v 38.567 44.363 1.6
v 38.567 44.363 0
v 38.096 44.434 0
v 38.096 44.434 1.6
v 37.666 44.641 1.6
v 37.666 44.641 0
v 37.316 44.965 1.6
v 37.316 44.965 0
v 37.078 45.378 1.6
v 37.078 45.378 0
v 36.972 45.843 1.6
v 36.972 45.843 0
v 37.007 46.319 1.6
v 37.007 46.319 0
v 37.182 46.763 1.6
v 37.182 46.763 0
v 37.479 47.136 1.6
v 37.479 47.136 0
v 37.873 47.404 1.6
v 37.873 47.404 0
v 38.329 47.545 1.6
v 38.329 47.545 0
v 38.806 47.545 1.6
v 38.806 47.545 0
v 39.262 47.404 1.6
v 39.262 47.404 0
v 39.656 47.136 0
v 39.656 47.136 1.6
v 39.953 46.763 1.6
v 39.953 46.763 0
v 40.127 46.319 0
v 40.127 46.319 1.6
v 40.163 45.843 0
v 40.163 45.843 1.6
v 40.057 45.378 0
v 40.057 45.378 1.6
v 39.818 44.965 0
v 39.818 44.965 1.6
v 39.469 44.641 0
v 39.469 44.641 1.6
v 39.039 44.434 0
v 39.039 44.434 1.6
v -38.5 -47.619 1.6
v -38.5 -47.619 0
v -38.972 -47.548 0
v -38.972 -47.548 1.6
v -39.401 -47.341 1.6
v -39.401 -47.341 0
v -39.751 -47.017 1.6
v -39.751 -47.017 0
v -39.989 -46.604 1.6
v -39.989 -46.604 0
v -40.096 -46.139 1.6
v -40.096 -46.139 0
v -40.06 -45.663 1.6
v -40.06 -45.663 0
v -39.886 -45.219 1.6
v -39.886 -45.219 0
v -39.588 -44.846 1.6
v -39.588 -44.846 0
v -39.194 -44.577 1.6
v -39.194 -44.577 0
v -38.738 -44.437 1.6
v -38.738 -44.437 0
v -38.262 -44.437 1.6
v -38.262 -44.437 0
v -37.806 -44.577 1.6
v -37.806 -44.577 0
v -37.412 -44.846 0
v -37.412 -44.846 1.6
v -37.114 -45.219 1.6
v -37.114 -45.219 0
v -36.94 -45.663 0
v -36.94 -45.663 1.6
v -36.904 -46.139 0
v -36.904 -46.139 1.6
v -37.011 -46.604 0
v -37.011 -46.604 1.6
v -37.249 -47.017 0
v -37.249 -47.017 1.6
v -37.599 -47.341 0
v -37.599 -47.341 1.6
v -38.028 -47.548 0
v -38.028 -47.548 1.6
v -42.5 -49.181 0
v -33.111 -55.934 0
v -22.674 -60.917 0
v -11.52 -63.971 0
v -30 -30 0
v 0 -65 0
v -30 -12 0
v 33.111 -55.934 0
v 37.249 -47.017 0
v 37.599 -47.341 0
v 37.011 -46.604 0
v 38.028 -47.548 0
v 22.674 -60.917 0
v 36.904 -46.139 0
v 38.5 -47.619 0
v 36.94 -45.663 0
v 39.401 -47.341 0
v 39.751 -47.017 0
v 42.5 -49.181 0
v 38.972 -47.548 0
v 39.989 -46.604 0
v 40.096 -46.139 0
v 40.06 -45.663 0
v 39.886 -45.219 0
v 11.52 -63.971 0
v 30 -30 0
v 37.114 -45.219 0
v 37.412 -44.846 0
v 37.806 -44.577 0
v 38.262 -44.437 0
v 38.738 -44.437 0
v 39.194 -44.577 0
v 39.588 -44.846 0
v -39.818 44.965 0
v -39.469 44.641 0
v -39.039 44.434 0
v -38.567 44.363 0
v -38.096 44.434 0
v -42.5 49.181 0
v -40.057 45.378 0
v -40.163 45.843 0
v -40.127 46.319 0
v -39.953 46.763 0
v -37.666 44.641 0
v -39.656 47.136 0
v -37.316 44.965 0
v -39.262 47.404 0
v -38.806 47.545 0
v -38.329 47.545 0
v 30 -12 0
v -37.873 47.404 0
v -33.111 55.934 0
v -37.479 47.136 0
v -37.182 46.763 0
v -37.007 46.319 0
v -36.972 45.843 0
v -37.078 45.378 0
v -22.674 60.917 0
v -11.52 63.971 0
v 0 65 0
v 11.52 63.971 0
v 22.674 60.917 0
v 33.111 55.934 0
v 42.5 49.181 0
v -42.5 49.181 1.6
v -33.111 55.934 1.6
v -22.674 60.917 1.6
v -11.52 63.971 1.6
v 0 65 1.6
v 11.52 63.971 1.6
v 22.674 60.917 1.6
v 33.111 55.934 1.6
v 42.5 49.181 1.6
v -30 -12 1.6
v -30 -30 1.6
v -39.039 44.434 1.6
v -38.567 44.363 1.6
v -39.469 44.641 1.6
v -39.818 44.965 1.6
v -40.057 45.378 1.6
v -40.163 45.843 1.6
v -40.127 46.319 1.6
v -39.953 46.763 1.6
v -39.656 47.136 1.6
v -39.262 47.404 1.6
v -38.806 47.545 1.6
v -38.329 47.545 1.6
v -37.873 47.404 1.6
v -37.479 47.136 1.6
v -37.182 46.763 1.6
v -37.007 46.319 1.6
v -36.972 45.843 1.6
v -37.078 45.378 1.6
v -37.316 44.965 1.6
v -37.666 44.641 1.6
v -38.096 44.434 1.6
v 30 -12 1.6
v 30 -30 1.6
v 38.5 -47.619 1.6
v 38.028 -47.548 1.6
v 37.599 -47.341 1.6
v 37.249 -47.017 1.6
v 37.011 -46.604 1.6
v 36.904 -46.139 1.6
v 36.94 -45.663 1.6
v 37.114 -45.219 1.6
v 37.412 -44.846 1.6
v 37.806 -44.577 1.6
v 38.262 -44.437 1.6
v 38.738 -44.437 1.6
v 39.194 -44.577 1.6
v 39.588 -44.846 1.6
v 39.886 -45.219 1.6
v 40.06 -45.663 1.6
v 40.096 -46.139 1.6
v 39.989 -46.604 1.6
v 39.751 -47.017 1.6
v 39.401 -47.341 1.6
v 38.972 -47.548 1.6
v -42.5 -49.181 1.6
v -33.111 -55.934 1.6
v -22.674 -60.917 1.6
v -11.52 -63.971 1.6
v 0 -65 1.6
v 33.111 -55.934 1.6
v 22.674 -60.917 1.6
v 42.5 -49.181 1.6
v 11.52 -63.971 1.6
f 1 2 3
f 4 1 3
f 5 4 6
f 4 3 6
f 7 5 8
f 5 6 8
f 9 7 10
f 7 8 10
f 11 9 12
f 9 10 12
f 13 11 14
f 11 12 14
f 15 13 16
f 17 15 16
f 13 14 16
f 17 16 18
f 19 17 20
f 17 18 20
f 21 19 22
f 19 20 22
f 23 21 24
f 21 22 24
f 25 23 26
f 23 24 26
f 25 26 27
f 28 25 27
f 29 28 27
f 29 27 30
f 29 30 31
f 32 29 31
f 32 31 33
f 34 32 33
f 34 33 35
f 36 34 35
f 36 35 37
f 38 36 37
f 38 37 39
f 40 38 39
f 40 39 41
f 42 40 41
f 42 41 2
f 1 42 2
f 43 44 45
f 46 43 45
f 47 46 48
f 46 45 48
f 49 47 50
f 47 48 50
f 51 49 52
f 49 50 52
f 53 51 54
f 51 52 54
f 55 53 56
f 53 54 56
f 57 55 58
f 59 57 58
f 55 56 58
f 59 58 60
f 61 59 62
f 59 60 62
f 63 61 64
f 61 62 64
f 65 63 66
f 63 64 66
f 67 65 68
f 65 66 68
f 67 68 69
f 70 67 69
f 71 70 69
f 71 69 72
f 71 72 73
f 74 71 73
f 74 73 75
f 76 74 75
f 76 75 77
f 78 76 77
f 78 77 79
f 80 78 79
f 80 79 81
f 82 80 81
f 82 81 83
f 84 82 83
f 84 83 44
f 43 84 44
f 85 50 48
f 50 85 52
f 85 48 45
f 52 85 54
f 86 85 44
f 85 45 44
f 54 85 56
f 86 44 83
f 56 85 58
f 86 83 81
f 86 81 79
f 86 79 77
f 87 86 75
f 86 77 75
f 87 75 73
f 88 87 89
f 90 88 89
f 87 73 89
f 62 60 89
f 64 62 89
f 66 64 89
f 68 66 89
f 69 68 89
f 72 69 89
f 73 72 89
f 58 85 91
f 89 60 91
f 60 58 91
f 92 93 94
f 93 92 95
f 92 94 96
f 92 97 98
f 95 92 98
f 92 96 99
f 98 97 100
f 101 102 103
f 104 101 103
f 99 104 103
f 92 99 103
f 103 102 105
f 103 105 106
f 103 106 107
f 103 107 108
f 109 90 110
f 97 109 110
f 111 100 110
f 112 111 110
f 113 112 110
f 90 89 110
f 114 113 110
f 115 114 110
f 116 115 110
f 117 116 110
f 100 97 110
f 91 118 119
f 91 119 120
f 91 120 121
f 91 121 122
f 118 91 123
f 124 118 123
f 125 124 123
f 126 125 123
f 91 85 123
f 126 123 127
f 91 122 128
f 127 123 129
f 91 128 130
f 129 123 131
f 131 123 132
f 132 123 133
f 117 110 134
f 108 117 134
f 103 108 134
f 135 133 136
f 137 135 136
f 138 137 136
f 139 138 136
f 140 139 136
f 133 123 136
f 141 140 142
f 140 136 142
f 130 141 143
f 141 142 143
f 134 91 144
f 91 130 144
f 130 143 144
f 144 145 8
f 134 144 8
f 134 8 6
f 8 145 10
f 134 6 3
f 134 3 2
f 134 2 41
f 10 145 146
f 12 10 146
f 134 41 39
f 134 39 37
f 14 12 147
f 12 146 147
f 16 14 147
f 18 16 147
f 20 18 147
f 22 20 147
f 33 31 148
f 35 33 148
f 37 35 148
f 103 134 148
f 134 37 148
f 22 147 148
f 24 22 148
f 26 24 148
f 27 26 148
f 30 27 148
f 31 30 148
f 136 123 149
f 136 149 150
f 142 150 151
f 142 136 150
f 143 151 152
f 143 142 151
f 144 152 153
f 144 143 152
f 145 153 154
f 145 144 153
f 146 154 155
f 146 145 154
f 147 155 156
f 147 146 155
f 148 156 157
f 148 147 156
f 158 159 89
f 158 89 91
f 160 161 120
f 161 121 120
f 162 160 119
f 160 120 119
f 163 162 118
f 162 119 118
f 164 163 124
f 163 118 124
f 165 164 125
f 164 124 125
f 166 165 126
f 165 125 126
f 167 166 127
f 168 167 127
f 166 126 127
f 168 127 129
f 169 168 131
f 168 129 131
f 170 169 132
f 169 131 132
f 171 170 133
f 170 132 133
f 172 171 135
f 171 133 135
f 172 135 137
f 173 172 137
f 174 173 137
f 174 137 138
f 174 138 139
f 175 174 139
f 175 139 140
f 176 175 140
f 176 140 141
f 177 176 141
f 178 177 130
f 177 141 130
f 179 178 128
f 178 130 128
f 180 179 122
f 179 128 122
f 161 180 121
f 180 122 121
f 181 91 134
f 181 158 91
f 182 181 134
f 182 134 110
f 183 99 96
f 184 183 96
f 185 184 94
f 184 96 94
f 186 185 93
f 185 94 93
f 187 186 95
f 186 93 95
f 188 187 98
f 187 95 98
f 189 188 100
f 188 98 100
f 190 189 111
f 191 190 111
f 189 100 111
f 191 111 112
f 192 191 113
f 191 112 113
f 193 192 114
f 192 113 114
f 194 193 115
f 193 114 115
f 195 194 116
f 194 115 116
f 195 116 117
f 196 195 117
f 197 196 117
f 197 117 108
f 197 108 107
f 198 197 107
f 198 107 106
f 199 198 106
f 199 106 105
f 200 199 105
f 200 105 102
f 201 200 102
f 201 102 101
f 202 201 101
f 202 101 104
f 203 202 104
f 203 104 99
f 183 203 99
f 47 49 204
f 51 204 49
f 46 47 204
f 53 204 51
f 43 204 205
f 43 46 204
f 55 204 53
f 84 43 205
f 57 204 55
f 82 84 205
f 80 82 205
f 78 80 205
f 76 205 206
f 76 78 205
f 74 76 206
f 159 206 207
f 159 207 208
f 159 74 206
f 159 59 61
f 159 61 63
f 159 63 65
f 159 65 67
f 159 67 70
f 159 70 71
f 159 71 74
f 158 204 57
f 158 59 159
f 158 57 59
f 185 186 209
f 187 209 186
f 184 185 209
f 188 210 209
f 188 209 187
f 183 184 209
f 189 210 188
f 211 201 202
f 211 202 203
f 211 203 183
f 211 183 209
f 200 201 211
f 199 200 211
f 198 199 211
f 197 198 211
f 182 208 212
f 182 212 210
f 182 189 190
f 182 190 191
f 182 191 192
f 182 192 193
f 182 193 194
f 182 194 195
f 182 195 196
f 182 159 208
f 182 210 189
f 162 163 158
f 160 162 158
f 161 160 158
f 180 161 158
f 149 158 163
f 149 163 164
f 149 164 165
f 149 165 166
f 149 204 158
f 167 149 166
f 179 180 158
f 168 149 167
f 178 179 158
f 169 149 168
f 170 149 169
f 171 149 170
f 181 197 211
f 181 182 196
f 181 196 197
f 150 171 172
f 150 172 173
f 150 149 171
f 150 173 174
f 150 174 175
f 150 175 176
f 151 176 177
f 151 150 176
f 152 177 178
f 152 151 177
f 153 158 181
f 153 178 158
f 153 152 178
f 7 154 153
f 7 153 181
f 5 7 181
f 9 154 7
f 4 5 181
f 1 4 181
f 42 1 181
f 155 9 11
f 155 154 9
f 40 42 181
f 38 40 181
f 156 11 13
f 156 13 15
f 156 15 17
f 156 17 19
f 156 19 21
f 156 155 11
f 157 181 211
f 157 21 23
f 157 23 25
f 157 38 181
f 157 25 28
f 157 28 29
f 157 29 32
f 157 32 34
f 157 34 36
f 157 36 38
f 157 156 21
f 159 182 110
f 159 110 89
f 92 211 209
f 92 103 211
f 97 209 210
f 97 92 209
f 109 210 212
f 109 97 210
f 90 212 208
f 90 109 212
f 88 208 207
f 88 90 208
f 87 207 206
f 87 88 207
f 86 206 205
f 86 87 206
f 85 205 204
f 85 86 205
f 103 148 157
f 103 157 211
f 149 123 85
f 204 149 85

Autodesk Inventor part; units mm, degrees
ref_plane "YZ Plane" through (0, 0, 0) normal (1, 0, 0) x (0, 1, 0)
ref_plane "XZ Plane" through (0, 0, 0) normal (0, 1, 0) x (-1, 0, 0)
ref_plane "XY Plane" through (0, 0, 0) normal (0, 0, 1) x (1, 0, 0)
sketch "スケッチ1" plane through (0, 0, 0) normal (0, 0, 1) x (1, 0, 0)
  circle A0 centre (0, 0) radius 65 construction
  line L0 (-42.5, 65) -> (42.5, 65) construction
  line L1 (42.5, 65) -> (42.5, -65) construction
  line L2 (42.5, -65) -> (-42.5, -65) construction
  line L3 (-42.5, -65) -> (-42.5, 65) construction
  arc A1 (42.5, 49.1808) -> (-42.5, 49.1808) centre (0, 0) ccw
  line L4 (-42.5, 49.1808) -> (-42.5, -49.1808)
  line L5 (42.5, 49.1808) -> (42.5, -49.1808)
  arc A2 (-42.5, -49.1808) -> (42.5, -49.1808) centre (0, 0) ccw
  point P0 (0, 65)
  dimension "d0" = 130
  dimension "d1" = 85
extrude "基板" add sketch "スケッチ1" along normal blind 1.6
sketch "スケッチ4" plane through (0, 0, 1.6) normal (0, 0, 1) x (1, 0, 0)
  line L0 (0, -55.1622) -> (0, 55.1622) construction
  line L1 (42.5, -49.1808) -> (42.5, 49.1808) construction
  circle A0 centre (0, 0) radius 60 construction
  line L2 (0, 0) -> (36.3616, 43.334) construction
  line L3 (0, 0) -> (56.5685, 0) construction
  point P0 (38.5, -46.019)
  point P1 (-38.5, -46.019)
  point P2 (38.5673, 45.9627)
  point P3 (-38.5673, 45.9627)
  dimension "d27" = 4
  dimension "d29" = 120
  dimension "d30" = 50
hole "スペーサ取付穴" at (38.5, -46.019, 1.6) at (-38.5, -46.019, 1.6) at (38.5673, 45.9627, 1.6) at (-38.5673, 45.9627, 1.6) direction (0, 0, -1) diameter 3.2 end through all
sketch "スケッチ5" plane through (0, 0, 1.6) normal (0, 0, 1) x (1, 0, 0)
  line L0 (-30, -12) -> (30, -12)
  line L1 (30, -12) -> (30, -30)
  line L2 (30, -30) -> (-30, -30)
  line L3 (-30, -30) -> (-30, -12)
  point P0 (0, 0)
  point P1 (0, -12)
  dimension "d38" = 60
  dimension "d39" = 18
  dimension "d40" = 12
extrude "バッテリー通し穴" cut sketch "スケッチ5" against normal through all
properties part number "BaseBoard2"
